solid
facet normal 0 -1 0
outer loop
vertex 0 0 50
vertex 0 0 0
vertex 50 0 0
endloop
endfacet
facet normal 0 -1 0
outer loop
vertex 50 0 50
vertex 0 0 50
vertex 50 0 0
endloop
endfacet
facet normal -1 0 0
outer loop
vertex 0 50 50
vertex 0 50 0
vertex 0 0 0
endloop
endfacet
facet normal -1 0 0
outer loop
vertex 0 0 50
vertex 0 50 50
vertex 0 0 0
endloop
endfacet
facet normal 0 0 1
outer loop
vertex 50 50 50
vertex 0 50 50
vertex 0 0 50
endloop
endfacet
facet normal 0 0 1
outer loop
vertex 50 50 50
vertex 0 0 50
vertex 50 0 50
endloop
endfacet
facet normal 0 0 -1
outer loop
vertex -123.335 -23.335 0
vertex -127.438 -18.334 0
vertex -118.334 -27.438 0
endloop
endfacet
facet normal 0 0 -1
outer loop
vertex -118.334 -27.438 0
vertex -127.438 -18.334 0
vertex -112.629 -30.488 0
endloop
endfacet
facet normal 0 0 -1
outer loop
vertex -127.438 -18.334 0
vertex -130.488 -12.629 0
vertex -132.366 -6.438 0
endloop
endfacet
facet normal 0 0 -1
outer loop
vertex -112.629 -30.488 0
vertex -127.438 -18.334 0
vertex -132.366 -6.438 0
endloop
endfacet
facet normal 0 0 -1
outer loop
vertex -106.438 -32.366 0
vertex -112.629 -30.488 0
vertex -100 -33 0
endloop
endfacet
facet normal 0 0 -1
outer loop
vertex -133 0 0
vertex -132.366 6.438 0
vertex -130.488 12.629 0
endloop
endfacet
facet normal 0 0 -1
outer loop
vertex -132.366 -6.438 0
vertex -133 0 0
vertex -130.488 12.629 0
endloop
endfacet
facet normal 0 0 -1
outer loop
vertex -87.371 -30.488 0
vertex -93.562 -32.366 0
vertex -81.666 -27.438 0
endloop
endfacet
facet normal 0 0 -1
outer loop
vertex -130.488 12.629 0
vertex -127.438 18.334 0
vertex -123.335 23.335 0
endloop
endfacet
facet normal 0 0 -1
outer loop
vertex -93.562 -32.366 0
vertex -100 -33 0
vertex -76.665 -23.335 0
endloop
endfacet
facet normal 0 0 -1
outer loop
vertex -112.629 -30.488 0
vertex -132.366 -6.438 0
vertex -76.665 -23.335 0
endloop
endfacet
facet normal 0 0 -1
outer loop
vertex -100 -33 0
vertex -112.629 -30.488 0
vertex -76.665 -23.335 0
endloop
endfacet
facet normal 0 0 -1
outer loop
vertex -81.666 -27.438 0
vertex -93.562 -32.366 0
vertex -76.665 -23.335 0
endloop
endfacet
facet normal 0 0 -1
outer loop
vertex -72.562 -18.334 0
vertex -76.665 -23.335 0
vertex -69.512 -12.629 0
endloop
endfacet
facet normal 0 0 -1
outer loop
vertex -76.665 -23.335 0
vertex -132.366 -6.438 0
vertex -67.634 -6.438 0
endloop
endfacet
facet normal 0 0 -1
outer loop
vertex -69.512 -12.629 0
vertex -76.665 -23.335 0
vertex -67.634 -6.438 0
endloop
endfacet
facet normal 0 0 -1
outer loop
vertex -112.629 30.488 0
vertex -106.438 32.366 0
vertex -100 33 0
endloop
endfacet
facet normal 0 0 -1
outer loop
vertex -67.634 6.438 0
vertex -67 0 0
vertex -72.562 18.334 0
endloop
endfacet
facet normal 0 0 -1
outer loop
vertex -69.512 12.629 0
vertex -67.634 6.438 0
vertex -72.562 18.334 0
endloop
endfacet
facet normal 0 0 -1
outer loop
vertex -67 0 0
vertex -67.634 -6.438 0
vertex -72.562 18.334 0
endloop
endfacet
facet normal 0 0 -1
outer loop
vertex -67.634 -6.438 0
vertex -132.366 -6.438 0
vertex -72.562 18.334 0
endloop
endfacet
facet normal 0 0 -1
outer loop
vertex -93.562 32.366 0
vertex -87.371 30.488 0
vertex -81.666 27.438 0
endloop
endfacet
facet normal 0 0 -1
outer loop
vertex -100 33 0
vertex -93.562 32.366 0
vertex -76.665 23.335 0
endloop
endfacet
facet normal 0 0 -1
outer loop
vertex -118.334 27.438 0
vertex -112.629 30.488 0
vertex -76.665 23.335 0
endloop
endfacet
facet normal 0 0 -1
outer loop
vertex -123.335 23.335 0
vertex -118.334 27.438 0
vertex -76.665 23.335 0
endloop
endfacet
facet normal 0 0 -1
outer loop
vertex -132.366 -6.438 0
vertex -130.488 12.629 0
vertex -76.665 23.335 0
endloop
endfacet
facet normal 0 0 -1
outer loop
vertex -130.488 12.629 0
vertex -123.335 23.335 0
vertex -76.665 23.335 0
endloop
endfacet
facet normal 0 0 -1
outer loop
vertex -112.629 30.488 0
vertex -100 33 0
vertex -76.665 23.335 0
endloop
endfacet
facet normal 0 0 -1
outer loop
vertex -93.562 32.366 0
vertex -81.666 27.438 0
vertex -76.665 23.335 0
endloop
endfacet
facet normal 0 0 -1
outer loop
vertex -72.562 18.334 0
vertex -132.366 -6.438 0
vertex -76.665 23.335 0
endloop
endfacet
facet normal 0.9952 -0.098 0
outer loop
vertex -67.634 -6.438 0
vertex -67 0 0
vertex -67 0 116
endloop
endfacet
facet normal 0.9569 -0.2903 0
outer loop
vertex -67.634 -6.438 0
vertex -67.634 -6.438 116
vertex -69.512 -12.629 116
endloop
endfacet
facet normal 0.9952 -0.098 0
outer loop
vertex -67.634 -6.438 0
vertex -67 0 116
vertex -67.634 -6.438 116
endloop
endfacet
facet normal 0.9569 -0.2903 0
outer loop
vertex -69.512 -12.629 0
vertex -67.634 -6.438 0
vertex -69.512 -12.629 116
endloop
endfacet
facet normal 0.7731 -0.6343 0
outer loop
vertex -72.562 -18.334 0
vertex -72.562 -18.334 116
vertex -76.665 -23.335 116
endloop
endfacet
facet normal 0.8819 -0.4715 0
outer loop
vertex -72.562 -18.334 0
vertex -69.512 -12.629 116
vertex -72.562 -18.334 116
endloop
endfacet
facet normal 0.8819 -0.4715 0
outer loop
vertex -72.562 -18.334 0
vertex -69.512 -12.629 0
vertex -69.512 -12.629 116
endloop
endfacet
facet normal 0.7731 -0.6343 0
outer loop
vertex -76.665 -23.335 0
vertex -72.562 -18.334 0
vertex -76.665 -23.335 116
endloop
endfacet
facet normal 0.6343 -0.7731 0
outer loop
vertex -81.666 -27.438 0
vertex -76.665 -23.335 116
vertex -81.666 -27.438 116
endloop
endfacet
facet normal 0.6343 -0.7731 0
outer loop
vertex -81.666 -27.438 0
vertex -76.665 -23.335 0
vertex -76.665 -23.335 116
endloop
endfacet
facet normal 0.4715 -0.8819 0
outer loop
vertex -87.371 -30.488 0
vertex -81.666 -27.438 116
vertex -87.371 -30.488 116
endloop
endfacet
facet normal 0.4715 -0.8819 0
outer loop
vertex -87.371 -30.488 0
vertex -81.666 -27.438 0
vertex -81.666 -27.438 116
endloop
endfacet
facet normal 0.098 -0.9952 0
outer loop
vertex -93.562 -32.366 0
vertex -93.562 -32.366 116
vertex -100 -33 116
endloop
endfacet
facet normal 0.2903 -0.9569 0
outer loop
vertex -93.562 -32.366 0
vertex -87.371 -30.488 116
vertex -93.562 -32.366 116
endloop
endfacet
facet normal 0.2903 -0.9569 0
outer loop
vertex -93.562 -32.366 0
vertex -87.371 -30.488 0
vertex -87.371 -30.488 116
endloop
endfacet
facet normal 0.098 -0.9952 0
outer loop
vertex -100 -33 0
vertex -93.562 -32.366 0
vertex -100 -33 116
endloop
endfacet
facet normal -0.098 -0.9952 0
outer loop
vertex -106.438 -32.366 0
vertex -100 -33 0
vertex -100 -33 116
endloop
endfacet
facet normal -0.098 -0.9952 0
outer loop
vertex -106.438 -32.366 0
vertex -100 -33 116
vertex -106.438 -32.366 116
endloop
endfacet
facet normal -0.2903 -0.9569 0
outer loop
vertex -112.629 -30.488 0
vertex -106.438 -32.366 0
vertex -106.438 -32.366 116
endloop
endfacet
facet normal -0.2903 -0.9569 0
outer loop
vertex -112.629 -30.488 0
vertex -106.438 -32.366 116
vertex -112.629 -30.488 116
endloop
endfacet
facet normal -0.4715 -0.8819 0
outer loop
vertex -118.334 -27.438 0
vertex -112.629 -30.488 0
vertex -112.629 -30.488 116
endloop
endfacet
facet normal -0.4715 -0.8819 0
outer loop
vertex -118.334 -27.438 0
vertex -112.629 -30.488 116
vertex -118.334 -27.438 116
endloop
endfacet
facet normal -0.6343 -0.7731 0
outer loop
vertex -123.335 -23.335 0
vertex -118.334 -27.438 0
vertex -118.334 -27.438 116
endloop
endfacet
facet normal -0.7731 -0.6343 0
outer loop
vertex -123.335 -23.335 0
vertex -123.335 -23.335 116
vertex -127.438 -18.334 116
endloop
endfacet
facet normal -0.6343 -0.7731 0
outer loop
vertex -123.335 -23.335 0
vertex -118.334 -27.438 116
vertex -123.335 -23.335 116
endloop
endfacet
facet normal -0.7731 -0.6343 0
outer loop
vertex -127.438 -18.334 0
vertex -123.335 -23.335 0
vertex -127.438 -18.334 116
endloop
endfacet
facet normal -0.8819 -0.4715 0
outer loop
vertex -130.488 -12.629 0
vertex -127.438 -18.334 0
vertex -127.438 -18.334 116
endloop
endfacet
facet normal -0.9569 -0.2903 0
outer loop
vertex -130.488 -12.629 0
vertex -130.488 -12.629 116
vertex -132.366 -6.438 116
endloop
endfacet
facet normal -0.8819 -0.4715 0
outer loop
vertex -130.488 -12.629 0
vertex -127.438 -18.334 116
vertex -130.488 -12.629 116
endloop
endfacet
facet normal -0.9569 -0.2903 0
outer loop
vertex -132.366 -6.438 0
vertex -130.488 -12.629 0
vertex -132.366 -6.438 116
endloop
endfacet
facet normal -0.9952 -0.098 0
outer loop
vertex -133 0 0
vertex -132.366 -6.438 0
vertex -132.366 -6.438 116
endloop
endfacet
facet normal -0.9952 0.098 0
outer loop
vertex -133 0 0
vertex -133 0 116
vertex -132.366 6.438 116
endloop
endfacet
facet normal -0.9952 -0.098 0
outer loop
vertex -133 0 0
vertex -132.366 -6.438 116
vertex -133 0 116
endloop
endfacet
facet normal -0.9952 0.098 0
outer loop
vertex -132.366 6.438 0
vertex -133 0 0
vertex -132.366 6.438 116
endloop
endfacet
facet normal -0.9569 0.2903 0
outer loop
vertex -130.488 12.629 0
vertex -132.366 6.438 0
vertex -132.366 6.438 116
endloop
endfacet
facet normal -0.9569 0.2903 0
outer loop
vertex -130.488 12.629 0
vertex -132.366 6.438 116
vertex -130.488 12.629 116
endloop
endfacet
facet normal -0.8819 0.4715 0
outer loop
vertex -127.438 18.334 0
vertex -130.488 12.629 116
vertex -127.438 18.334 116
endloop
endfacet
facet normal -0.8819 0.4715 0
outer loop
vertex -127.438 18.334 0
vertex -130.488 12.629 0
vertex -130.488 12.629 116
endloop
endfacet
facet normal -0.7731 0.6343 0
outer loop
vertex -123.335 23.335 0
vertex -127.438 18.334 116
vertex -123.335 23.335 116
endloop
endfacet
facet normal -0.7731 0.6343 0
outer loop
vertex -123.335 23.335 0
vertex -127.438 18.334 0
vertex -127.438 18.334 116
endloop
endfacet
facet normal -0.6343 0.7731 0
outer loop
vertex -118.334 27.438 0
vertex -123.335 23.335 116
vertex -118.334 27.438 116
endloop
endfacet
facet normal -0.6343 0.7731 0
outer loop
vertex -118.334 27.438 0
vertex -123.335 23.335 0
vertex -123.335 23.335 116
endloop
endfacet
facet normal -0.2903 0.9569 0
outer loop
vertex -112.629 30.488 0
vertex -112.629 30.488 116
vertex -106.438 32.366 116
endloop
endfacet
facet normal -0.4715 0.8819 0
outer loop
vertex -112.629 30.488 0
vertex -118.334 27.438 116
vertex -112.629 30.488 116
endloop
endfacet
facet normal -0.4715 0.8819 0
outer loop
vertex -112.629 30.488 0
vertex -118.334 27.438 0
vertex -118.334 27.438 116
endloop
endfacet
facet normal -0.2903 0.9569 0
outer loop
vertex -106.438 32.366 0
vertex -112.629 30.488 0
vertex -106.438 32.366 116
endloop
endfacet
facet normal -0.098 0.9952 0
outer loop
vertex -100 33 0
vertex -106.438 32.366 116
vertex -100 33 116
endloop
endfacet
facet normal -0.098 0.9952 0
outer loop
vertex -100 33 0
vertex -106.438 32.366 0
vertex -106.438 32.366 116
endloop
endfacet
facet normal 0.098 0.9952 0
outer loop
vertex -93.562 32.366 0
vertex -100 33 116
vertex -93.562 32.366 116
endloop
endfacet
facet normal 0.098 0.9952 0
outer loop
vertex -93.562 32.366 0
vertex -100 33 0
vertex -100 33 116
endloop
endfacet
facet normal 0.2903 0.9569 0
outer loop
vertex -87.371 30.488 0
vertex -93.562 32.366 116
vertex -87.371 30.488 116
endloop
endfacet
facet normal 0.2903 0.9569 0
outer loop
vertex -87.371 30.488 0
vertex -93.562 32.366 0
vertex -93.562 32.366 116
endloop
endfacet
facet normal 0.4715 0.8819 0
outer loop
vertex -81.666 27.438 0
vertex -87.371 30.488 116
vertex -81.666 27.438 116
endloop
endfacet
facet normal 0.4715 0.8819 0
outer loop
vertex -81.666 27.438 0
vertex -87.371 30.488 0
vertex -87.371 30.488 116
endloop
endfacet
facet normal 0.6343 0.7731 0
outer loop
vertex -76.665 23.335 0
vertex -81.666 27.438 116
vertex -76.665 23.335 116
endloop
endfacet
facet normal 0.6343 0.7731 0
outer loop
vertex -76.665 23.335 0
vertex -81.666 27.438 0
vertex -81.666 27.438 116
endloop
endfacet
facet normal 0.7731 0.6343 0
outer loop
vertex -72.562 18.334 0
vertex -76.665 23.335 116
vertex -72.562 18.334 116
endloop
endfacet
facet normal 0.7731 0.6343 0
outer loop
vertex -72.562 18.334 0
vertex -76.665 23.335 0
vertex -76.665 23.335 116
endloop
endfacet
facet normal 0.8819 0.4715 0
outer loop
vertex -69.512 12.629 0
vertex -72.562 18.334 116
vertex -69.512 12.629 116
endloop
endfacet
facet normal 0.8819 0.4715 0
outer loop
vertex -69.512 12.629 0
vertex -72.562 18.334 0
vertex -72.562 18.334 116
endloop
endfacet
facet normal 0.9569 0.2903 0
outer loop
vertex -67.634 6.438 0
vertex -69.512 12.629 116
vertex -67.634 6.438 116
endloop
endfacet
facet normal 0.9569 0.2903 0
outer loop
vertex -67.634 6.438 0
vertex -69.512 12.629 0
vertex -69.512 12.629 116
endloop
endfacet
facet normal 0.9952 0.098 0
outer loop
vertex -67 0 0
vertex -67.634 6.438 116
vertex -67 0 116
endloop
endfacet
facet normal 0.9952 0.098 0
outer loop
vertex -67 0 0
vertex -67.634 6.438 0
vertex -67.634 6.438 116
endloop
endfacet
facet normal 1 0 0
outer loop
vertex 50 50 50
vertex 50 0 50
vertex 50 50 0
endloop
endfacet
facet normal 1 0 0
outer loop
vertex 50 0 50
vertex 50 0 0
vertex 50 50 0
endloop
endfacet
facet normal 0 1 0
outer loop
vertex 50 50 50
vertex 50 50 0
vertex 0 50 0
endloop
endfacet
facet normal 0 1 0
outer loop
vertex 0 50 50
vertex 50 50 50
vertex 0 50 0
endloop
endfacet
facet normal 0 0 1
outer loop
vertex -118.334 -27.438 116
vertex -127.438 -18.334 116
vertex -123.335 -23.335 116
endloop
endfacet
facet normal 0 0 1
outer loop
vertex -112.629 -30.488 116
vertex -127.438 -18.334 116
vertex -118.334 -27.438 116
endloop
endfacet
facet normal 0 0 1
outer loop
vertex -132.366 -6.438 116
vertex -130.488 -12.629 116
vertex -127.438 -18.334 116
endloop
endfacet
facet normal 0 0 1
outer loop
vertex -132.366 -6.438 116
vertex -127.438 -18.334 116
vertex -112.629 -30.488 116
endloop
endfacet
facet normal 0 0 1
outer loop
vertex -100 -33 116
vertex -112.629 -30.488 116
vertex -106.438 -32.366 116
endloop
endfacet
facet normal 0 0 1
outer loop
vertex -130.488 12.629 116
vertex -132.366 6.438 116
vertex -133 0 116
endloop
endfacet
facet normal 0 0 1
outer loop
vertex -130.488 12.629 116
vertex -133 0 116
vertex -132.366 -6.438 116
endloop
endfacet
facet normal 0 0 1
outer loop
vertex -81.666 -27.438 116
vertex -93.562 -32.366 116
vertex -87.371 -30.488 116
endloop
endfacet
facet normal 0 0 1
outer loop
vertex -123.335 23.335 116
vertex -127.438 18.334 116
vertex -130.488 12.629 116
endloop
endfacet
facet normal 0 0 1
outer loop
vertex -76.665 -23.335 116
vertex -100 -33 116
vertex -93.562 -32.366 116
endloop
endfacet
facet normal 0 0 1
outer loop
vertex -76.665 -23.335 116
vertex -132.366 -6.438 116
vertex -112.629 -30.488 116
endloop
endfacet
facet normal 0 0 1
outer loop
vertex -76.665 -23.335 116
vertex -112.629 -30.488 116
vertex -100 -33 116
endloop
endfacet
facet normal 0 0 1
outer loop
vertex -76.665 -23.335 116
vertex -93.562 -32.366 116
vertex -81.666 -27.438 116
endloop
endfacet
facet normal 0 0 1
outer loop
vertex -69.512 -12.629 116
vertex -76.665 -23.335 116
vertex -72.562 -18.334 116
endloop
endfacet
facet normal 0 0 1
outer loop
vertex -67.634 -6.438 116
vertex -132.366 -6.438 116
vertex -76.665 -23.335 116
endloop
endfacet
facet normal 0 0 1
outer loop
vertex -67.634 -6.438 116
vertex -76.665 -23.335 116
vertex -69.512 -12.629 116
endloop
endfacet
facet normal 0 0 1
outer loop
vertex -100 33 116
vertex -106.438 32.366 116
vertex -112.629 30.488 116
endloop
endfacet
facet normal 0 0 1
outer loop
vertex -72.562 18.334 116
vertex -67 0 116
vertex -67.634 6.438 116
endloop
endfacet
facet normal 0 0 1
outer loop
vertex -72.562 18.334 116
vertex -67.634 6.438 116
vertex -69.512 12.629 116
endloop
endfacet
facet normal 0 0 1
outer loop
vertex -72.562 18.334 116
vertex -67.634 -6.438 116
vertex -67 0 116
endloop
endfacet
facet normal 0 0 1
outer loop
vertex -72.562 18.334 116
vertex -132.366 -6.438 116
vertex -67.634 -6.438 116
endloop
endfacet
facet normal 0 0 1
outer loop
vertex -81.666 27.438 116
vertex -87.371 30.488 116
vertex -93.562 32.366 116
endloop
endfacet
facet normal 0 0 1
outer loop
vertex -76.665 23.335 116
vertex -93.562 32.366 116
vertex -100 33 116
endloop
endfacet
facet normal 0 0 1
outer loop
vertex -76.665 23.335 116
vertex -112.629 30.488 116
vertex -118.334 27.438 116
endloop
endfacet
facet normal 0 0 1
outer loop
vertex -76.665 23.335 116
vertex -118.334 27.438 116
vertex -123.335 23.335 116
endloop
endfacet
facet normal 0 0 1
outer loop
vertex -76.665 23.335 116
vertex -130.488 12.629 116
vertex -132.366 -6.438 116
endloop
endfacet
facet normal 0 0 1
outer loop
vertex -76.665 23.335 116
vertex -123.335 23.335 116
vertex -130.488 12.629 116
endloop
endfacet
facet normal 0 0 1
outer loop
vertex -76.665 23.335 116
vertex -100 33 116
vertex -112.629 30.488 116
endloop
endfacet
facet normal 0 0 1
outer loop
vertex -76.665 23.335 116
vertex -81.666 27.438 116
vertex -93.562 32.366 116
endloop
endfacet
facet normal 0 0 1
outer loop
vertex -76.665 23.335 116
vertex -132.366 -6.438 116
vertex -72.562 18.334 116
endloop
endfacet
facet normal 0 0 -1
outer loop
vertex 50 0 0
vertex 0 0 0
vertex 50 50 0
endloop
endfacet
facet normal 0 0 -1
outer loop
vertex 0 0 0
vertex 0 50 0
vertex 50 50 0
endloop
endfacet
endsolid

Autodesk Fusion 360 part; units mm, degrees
sketch "Sketch1" plane through (0, 0, 0) normal (0, 0, 1) x (1, 0, 0)
  line L0 (0, 0) -> (50, 0)
  line L1 (50, 0) -> (50, 50)
  line L2 (50, 50) -> (0, 50)
  line L3 (0, 50) -> (0, 0)
extrude "Extrude1" add sketch "Sketch1" along normal blind 50 makes body 1
sketch "Sketch2" plane through (0, 0, 0) normal (0, 0, 1) x (1, 0, 0)
  circle A0 centre (-100, 0) radius 33
  dimension "d3" = 66
extrude "Extrude2" add sketch "Sketch2" along normal blind 116 separate body makes body 2
